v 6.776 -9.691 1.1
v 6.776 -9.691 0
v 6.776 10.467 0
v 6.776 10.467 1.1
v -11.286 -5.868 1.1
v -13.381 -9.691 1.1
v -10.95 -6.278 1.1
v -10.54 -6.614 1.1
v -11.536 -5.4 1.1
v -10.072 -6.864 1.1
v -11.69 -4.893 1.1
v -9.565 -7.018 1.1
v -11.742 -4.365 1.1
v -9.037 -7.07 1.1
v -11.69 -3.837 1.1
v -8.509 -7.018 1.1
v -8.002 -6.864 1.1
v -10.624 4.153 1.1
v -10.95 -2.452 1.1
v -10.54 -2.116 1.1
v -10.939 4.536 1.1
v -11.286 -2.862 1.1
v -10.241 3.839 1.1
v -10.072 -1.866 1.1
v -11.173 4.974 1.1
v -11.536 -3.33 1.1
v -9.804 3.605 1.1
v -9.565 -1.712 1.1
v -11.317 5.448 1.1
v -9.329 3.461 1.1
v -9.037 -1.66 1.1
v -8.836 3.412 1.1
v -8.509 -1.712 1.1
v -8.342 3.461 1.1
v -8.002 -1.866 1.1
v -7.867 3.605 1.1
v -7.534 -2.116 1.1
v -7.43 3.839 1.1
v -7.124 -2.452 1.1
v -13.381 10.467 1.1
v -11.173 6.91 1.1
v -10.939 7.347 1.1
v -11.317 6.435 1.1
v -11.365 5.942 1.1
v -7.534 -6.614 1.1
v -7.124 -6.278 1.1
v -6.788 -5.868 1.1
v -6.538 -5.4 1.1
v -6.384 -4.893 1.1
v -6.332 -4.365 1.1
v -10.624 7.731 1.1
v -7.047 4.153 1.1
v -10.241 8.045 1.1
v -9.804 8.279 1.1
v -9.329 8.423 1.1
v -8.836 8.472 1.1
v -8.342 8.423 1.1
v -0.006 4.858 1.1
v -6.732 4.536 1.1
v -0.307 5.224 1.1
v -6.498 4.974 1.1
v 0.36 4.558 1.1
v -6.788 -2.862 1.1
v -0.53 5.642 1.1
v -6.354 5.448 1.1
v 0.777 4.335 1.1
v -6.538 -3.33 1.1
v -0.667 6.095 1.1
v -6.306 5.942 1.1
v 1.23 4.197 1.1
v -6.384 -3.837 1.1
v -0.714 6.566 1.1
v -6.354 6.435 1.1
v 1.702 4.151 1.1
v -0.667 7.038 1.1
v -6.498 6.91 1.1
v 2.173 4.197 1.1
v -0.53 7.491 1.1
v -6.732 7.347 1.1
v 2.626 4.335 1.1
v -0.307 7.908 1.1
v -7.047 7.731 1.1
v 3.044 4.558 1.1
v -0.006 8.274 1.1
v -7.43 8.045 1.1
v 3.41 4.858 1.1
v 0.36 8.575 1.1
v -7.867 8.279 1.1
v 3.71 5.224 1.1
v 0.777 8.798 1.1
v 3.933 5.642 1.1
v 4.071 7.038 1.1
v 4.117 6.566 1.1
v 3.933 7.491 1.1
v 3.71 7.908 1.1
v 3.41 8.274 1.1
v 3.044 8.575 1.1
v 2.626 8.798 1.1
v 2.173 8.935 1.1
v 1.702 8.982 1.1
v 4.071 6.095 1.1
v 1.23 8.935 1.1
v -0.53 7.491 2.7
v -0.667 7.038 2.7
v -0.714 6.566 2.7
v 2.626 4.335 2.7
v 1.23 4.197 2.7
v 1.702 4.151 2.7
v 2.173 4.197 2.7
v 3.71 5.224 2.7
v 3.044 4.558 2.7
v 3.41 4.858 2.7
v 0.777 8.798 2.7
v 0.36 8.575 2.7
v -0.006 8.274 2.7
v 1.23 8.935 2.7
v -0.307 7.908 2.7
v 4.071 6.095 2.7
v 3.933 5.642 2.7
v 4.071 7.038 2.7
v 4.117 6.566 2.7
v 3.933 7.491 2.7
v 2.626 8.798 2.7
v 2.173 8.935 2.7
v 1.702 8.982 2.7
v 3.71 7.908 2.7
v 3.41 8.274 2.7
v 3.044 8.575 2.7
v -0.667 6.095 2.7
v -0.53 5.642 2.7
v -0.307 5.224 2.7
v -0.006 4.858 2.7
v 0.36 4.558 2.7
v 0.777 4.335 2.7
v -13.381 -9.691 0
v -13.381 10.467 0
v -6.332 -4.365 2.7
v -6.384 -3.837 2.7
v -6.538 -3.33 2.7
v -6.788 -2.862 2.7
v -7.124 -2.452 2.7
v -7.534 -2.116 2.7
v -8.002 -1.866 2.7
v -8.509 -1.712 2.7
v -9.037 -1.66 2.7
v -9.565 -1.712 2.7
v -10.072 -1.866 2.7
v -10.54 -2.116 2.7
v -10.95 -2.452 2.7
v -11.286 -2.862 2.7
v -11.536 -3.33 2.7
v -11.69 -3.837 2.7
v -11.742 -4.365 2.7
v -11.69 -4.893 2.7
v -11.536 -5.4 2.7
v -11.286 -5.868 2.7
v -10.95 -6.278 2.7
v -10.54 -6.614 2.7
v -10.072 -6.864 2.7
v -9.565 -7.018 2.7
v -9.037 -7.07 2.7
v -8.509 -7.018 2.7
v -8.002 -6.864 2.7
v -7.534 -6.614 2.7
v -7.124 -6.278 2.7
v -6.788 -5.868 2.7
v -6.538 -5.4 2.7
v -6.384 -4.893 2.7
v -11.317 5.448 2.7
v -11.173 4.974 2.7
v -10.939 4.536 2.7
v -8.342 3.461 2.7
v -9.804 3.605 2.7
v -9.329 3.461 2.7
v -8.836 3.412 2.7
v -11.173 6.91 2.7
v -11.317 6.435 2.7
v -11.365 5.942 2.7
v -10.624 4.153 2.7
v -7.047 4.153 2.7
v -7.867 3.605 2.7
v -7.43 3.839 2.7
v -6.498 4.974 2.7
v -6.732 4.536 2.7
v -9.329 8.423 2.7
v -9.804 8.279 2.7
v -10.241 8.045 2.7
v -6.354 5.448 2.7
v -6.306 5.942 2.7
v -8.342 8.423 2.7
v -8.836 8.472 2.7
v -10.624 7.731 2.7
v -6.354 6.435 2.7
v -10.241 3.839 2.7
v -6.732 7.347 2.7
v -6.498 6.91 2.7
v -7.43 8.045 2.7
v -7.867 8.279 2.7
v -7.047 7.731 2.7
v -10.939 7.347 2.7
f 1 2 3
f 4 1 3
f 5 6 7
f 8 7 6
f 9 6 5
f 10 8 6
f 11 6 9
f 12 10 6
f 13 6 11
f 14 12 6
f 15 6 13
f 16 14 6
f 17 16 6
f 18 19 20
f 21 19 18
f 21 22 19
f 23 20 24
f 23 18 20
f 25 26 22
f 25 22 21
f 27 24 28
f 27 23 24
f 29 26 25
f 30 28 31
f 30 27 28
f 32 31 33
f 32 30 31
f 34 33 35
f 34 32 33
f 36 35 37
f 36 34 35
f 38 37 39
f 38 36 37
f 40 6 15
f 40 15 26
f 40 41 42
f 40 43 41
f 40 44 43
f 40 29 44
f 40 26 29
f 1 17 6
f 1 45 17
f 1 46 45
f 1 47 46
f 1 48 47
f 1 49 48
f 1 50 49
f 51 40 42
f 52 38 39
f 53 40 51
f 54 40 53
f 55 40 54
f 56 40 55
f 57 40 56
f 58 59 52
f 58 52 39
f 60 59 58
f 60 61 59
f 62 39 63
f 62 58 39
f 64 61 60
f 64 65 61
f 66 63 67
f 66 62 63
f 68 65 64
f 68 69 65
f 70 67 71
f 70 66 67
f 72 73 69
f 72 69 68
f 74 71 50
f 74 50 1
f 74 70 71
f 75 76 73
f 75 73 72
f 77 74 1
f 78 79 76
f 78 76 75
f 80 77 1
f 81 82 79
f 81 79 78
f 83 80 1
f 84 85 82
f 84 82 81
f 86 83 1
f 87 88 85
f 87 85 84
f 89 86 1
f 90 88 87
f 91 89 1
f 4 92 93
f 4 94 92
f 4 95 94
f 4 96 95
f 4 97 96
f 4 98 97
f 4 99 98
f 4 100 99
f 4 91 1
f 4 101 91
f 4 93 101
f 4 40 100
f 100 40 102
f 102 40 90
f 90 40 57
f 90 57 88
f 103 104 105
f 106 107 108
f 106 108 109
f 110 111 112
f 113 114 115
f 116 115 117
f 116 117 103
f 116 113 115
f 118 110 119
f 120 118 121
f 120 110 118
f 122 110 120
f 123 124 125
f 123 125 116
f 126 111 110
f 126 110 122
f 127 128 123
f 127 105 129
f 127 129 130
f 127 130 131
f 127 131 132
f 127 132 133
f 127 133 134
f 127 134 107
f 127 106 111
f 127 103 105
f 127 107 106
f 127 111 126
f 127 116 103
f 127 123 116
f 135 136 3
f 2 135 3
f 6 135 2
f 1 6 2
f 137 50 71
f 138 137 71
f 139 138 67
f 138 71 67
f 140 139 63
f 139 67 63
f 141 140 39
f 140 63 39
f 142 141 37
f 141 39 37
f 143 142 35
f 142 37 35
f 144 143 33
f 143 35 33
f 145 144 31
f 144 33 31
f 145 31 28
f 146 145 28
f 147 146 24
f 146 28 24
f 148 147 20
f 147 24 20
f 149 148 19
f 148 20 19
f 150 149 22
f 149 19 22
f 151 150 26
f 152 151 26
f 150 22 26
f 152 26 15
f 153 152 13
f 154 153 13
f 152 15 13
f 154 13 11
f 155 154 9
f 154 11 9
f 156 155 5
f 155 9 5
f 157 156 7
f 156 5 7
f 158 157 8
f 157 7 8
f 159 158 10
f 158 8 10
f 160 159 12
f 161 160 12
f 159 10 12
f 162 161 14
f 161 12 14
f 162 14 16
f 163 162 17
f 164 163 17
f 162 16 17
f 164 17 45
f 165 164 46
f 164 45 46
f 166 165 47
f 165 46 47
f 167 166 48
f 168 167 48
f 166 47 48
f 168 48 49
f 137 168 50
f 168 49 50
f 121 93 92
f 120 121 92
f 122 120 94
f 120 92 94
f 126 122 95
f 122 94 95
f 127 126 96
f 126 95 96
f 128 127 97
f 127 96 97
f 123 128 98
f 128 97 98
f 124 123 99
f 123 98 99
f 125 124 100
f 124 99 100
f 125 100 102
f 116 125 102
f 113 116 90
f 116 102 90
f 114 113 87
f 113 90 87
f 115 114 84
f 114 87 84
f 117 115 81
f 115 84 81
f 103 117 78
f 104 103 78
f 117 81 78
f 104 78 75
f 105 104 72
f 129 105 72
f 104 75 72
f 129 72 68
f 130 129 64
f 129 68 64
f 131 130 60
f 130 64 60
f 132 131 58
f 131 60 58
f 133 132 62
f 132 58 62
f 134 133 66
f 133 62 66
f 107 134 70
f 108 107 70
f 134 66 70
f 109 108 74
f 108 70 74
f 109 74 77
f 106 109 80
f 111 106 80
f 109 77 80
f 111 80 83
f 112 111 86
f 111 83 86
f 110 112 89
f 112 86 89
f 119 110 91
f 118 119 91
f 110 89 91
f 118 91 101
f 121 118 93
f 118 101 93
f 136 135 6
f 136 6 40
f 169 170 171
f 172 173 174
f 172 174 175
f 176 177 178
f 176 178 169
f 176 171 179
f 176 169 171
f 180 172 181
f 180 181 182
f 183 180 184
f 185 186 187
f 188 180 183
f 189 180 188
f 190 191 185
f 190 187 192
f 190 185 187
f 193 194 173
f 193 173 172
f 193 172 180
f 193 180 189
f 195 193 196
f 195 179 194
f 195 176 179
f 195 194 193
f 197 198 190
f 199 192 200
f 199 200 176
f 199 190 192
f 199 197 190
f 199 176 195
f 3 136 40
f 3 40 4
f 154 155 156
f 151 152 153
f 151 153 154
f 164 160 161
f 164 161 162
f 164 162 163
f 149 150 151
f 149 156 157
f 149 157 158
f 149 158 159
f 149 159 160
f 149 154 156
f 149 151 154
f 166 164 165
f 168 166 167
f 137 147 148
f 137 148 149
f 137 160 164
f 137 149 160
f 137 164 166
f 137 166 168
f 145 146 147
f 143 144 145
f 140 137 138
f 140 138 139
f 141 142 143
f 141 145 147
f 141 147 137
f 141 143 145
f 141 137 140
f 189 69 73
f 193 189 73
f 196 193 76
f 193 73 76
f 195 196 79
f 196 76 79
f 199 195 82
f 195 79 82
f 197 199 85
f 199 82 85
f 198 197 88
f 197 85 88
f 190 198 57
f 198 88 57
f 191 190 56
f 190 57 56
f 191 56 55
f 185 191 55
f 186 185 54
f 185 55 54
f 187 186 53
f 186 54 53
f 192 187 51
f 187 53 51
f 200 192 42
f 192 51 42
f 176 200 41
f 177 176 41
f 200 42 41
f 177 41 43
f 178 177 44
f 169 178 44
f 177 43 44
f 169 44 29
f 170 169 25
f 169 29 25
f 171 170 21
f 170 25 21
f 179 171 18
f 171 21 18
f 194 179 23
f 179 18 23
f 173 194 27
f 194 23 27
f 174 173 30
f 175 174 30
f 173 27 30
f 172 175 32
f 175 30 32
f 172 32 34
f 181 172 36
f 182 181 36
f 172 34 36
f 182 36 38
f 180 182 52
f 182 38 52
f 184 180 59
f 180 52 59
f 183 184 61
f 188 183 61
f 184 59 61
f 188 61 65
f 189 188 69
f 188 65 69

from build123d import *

# Parameters (mm, degrees)
F0_W     = 20.157362
F0_H     = 20.157362
F1_DEPTH = 1.1
F2_R     = 2.529732
F2_R_2   = 2.415473
F2_R_3   = 2.705087
F3_DEPTH = 1.6


with BuildPart() as f1:
    # F0 (on Top) → F1 (new body)
    with BuildSketch(Plane.XY):
        with Locations((-3.302667, 0.387924)):
            Rectangle(F0_W, F0_H)
    extrude(amount=F1_DEPTH)

    # F2 (on face) → F3 (join)
    with BuildSketch(Plane.XY.offset(1.1)):
        with Locations((-8.835531, 5.941908)):
            Circle(F2_R)
        with Locations((1.701719, 6.566437)):
            Circle(F2_R_2)
        with Locations((-9.036944, -4.364801)):
            Circle(F2_R_3)
    extrude(amount=F3_DEPTH)


solid = f1.part
